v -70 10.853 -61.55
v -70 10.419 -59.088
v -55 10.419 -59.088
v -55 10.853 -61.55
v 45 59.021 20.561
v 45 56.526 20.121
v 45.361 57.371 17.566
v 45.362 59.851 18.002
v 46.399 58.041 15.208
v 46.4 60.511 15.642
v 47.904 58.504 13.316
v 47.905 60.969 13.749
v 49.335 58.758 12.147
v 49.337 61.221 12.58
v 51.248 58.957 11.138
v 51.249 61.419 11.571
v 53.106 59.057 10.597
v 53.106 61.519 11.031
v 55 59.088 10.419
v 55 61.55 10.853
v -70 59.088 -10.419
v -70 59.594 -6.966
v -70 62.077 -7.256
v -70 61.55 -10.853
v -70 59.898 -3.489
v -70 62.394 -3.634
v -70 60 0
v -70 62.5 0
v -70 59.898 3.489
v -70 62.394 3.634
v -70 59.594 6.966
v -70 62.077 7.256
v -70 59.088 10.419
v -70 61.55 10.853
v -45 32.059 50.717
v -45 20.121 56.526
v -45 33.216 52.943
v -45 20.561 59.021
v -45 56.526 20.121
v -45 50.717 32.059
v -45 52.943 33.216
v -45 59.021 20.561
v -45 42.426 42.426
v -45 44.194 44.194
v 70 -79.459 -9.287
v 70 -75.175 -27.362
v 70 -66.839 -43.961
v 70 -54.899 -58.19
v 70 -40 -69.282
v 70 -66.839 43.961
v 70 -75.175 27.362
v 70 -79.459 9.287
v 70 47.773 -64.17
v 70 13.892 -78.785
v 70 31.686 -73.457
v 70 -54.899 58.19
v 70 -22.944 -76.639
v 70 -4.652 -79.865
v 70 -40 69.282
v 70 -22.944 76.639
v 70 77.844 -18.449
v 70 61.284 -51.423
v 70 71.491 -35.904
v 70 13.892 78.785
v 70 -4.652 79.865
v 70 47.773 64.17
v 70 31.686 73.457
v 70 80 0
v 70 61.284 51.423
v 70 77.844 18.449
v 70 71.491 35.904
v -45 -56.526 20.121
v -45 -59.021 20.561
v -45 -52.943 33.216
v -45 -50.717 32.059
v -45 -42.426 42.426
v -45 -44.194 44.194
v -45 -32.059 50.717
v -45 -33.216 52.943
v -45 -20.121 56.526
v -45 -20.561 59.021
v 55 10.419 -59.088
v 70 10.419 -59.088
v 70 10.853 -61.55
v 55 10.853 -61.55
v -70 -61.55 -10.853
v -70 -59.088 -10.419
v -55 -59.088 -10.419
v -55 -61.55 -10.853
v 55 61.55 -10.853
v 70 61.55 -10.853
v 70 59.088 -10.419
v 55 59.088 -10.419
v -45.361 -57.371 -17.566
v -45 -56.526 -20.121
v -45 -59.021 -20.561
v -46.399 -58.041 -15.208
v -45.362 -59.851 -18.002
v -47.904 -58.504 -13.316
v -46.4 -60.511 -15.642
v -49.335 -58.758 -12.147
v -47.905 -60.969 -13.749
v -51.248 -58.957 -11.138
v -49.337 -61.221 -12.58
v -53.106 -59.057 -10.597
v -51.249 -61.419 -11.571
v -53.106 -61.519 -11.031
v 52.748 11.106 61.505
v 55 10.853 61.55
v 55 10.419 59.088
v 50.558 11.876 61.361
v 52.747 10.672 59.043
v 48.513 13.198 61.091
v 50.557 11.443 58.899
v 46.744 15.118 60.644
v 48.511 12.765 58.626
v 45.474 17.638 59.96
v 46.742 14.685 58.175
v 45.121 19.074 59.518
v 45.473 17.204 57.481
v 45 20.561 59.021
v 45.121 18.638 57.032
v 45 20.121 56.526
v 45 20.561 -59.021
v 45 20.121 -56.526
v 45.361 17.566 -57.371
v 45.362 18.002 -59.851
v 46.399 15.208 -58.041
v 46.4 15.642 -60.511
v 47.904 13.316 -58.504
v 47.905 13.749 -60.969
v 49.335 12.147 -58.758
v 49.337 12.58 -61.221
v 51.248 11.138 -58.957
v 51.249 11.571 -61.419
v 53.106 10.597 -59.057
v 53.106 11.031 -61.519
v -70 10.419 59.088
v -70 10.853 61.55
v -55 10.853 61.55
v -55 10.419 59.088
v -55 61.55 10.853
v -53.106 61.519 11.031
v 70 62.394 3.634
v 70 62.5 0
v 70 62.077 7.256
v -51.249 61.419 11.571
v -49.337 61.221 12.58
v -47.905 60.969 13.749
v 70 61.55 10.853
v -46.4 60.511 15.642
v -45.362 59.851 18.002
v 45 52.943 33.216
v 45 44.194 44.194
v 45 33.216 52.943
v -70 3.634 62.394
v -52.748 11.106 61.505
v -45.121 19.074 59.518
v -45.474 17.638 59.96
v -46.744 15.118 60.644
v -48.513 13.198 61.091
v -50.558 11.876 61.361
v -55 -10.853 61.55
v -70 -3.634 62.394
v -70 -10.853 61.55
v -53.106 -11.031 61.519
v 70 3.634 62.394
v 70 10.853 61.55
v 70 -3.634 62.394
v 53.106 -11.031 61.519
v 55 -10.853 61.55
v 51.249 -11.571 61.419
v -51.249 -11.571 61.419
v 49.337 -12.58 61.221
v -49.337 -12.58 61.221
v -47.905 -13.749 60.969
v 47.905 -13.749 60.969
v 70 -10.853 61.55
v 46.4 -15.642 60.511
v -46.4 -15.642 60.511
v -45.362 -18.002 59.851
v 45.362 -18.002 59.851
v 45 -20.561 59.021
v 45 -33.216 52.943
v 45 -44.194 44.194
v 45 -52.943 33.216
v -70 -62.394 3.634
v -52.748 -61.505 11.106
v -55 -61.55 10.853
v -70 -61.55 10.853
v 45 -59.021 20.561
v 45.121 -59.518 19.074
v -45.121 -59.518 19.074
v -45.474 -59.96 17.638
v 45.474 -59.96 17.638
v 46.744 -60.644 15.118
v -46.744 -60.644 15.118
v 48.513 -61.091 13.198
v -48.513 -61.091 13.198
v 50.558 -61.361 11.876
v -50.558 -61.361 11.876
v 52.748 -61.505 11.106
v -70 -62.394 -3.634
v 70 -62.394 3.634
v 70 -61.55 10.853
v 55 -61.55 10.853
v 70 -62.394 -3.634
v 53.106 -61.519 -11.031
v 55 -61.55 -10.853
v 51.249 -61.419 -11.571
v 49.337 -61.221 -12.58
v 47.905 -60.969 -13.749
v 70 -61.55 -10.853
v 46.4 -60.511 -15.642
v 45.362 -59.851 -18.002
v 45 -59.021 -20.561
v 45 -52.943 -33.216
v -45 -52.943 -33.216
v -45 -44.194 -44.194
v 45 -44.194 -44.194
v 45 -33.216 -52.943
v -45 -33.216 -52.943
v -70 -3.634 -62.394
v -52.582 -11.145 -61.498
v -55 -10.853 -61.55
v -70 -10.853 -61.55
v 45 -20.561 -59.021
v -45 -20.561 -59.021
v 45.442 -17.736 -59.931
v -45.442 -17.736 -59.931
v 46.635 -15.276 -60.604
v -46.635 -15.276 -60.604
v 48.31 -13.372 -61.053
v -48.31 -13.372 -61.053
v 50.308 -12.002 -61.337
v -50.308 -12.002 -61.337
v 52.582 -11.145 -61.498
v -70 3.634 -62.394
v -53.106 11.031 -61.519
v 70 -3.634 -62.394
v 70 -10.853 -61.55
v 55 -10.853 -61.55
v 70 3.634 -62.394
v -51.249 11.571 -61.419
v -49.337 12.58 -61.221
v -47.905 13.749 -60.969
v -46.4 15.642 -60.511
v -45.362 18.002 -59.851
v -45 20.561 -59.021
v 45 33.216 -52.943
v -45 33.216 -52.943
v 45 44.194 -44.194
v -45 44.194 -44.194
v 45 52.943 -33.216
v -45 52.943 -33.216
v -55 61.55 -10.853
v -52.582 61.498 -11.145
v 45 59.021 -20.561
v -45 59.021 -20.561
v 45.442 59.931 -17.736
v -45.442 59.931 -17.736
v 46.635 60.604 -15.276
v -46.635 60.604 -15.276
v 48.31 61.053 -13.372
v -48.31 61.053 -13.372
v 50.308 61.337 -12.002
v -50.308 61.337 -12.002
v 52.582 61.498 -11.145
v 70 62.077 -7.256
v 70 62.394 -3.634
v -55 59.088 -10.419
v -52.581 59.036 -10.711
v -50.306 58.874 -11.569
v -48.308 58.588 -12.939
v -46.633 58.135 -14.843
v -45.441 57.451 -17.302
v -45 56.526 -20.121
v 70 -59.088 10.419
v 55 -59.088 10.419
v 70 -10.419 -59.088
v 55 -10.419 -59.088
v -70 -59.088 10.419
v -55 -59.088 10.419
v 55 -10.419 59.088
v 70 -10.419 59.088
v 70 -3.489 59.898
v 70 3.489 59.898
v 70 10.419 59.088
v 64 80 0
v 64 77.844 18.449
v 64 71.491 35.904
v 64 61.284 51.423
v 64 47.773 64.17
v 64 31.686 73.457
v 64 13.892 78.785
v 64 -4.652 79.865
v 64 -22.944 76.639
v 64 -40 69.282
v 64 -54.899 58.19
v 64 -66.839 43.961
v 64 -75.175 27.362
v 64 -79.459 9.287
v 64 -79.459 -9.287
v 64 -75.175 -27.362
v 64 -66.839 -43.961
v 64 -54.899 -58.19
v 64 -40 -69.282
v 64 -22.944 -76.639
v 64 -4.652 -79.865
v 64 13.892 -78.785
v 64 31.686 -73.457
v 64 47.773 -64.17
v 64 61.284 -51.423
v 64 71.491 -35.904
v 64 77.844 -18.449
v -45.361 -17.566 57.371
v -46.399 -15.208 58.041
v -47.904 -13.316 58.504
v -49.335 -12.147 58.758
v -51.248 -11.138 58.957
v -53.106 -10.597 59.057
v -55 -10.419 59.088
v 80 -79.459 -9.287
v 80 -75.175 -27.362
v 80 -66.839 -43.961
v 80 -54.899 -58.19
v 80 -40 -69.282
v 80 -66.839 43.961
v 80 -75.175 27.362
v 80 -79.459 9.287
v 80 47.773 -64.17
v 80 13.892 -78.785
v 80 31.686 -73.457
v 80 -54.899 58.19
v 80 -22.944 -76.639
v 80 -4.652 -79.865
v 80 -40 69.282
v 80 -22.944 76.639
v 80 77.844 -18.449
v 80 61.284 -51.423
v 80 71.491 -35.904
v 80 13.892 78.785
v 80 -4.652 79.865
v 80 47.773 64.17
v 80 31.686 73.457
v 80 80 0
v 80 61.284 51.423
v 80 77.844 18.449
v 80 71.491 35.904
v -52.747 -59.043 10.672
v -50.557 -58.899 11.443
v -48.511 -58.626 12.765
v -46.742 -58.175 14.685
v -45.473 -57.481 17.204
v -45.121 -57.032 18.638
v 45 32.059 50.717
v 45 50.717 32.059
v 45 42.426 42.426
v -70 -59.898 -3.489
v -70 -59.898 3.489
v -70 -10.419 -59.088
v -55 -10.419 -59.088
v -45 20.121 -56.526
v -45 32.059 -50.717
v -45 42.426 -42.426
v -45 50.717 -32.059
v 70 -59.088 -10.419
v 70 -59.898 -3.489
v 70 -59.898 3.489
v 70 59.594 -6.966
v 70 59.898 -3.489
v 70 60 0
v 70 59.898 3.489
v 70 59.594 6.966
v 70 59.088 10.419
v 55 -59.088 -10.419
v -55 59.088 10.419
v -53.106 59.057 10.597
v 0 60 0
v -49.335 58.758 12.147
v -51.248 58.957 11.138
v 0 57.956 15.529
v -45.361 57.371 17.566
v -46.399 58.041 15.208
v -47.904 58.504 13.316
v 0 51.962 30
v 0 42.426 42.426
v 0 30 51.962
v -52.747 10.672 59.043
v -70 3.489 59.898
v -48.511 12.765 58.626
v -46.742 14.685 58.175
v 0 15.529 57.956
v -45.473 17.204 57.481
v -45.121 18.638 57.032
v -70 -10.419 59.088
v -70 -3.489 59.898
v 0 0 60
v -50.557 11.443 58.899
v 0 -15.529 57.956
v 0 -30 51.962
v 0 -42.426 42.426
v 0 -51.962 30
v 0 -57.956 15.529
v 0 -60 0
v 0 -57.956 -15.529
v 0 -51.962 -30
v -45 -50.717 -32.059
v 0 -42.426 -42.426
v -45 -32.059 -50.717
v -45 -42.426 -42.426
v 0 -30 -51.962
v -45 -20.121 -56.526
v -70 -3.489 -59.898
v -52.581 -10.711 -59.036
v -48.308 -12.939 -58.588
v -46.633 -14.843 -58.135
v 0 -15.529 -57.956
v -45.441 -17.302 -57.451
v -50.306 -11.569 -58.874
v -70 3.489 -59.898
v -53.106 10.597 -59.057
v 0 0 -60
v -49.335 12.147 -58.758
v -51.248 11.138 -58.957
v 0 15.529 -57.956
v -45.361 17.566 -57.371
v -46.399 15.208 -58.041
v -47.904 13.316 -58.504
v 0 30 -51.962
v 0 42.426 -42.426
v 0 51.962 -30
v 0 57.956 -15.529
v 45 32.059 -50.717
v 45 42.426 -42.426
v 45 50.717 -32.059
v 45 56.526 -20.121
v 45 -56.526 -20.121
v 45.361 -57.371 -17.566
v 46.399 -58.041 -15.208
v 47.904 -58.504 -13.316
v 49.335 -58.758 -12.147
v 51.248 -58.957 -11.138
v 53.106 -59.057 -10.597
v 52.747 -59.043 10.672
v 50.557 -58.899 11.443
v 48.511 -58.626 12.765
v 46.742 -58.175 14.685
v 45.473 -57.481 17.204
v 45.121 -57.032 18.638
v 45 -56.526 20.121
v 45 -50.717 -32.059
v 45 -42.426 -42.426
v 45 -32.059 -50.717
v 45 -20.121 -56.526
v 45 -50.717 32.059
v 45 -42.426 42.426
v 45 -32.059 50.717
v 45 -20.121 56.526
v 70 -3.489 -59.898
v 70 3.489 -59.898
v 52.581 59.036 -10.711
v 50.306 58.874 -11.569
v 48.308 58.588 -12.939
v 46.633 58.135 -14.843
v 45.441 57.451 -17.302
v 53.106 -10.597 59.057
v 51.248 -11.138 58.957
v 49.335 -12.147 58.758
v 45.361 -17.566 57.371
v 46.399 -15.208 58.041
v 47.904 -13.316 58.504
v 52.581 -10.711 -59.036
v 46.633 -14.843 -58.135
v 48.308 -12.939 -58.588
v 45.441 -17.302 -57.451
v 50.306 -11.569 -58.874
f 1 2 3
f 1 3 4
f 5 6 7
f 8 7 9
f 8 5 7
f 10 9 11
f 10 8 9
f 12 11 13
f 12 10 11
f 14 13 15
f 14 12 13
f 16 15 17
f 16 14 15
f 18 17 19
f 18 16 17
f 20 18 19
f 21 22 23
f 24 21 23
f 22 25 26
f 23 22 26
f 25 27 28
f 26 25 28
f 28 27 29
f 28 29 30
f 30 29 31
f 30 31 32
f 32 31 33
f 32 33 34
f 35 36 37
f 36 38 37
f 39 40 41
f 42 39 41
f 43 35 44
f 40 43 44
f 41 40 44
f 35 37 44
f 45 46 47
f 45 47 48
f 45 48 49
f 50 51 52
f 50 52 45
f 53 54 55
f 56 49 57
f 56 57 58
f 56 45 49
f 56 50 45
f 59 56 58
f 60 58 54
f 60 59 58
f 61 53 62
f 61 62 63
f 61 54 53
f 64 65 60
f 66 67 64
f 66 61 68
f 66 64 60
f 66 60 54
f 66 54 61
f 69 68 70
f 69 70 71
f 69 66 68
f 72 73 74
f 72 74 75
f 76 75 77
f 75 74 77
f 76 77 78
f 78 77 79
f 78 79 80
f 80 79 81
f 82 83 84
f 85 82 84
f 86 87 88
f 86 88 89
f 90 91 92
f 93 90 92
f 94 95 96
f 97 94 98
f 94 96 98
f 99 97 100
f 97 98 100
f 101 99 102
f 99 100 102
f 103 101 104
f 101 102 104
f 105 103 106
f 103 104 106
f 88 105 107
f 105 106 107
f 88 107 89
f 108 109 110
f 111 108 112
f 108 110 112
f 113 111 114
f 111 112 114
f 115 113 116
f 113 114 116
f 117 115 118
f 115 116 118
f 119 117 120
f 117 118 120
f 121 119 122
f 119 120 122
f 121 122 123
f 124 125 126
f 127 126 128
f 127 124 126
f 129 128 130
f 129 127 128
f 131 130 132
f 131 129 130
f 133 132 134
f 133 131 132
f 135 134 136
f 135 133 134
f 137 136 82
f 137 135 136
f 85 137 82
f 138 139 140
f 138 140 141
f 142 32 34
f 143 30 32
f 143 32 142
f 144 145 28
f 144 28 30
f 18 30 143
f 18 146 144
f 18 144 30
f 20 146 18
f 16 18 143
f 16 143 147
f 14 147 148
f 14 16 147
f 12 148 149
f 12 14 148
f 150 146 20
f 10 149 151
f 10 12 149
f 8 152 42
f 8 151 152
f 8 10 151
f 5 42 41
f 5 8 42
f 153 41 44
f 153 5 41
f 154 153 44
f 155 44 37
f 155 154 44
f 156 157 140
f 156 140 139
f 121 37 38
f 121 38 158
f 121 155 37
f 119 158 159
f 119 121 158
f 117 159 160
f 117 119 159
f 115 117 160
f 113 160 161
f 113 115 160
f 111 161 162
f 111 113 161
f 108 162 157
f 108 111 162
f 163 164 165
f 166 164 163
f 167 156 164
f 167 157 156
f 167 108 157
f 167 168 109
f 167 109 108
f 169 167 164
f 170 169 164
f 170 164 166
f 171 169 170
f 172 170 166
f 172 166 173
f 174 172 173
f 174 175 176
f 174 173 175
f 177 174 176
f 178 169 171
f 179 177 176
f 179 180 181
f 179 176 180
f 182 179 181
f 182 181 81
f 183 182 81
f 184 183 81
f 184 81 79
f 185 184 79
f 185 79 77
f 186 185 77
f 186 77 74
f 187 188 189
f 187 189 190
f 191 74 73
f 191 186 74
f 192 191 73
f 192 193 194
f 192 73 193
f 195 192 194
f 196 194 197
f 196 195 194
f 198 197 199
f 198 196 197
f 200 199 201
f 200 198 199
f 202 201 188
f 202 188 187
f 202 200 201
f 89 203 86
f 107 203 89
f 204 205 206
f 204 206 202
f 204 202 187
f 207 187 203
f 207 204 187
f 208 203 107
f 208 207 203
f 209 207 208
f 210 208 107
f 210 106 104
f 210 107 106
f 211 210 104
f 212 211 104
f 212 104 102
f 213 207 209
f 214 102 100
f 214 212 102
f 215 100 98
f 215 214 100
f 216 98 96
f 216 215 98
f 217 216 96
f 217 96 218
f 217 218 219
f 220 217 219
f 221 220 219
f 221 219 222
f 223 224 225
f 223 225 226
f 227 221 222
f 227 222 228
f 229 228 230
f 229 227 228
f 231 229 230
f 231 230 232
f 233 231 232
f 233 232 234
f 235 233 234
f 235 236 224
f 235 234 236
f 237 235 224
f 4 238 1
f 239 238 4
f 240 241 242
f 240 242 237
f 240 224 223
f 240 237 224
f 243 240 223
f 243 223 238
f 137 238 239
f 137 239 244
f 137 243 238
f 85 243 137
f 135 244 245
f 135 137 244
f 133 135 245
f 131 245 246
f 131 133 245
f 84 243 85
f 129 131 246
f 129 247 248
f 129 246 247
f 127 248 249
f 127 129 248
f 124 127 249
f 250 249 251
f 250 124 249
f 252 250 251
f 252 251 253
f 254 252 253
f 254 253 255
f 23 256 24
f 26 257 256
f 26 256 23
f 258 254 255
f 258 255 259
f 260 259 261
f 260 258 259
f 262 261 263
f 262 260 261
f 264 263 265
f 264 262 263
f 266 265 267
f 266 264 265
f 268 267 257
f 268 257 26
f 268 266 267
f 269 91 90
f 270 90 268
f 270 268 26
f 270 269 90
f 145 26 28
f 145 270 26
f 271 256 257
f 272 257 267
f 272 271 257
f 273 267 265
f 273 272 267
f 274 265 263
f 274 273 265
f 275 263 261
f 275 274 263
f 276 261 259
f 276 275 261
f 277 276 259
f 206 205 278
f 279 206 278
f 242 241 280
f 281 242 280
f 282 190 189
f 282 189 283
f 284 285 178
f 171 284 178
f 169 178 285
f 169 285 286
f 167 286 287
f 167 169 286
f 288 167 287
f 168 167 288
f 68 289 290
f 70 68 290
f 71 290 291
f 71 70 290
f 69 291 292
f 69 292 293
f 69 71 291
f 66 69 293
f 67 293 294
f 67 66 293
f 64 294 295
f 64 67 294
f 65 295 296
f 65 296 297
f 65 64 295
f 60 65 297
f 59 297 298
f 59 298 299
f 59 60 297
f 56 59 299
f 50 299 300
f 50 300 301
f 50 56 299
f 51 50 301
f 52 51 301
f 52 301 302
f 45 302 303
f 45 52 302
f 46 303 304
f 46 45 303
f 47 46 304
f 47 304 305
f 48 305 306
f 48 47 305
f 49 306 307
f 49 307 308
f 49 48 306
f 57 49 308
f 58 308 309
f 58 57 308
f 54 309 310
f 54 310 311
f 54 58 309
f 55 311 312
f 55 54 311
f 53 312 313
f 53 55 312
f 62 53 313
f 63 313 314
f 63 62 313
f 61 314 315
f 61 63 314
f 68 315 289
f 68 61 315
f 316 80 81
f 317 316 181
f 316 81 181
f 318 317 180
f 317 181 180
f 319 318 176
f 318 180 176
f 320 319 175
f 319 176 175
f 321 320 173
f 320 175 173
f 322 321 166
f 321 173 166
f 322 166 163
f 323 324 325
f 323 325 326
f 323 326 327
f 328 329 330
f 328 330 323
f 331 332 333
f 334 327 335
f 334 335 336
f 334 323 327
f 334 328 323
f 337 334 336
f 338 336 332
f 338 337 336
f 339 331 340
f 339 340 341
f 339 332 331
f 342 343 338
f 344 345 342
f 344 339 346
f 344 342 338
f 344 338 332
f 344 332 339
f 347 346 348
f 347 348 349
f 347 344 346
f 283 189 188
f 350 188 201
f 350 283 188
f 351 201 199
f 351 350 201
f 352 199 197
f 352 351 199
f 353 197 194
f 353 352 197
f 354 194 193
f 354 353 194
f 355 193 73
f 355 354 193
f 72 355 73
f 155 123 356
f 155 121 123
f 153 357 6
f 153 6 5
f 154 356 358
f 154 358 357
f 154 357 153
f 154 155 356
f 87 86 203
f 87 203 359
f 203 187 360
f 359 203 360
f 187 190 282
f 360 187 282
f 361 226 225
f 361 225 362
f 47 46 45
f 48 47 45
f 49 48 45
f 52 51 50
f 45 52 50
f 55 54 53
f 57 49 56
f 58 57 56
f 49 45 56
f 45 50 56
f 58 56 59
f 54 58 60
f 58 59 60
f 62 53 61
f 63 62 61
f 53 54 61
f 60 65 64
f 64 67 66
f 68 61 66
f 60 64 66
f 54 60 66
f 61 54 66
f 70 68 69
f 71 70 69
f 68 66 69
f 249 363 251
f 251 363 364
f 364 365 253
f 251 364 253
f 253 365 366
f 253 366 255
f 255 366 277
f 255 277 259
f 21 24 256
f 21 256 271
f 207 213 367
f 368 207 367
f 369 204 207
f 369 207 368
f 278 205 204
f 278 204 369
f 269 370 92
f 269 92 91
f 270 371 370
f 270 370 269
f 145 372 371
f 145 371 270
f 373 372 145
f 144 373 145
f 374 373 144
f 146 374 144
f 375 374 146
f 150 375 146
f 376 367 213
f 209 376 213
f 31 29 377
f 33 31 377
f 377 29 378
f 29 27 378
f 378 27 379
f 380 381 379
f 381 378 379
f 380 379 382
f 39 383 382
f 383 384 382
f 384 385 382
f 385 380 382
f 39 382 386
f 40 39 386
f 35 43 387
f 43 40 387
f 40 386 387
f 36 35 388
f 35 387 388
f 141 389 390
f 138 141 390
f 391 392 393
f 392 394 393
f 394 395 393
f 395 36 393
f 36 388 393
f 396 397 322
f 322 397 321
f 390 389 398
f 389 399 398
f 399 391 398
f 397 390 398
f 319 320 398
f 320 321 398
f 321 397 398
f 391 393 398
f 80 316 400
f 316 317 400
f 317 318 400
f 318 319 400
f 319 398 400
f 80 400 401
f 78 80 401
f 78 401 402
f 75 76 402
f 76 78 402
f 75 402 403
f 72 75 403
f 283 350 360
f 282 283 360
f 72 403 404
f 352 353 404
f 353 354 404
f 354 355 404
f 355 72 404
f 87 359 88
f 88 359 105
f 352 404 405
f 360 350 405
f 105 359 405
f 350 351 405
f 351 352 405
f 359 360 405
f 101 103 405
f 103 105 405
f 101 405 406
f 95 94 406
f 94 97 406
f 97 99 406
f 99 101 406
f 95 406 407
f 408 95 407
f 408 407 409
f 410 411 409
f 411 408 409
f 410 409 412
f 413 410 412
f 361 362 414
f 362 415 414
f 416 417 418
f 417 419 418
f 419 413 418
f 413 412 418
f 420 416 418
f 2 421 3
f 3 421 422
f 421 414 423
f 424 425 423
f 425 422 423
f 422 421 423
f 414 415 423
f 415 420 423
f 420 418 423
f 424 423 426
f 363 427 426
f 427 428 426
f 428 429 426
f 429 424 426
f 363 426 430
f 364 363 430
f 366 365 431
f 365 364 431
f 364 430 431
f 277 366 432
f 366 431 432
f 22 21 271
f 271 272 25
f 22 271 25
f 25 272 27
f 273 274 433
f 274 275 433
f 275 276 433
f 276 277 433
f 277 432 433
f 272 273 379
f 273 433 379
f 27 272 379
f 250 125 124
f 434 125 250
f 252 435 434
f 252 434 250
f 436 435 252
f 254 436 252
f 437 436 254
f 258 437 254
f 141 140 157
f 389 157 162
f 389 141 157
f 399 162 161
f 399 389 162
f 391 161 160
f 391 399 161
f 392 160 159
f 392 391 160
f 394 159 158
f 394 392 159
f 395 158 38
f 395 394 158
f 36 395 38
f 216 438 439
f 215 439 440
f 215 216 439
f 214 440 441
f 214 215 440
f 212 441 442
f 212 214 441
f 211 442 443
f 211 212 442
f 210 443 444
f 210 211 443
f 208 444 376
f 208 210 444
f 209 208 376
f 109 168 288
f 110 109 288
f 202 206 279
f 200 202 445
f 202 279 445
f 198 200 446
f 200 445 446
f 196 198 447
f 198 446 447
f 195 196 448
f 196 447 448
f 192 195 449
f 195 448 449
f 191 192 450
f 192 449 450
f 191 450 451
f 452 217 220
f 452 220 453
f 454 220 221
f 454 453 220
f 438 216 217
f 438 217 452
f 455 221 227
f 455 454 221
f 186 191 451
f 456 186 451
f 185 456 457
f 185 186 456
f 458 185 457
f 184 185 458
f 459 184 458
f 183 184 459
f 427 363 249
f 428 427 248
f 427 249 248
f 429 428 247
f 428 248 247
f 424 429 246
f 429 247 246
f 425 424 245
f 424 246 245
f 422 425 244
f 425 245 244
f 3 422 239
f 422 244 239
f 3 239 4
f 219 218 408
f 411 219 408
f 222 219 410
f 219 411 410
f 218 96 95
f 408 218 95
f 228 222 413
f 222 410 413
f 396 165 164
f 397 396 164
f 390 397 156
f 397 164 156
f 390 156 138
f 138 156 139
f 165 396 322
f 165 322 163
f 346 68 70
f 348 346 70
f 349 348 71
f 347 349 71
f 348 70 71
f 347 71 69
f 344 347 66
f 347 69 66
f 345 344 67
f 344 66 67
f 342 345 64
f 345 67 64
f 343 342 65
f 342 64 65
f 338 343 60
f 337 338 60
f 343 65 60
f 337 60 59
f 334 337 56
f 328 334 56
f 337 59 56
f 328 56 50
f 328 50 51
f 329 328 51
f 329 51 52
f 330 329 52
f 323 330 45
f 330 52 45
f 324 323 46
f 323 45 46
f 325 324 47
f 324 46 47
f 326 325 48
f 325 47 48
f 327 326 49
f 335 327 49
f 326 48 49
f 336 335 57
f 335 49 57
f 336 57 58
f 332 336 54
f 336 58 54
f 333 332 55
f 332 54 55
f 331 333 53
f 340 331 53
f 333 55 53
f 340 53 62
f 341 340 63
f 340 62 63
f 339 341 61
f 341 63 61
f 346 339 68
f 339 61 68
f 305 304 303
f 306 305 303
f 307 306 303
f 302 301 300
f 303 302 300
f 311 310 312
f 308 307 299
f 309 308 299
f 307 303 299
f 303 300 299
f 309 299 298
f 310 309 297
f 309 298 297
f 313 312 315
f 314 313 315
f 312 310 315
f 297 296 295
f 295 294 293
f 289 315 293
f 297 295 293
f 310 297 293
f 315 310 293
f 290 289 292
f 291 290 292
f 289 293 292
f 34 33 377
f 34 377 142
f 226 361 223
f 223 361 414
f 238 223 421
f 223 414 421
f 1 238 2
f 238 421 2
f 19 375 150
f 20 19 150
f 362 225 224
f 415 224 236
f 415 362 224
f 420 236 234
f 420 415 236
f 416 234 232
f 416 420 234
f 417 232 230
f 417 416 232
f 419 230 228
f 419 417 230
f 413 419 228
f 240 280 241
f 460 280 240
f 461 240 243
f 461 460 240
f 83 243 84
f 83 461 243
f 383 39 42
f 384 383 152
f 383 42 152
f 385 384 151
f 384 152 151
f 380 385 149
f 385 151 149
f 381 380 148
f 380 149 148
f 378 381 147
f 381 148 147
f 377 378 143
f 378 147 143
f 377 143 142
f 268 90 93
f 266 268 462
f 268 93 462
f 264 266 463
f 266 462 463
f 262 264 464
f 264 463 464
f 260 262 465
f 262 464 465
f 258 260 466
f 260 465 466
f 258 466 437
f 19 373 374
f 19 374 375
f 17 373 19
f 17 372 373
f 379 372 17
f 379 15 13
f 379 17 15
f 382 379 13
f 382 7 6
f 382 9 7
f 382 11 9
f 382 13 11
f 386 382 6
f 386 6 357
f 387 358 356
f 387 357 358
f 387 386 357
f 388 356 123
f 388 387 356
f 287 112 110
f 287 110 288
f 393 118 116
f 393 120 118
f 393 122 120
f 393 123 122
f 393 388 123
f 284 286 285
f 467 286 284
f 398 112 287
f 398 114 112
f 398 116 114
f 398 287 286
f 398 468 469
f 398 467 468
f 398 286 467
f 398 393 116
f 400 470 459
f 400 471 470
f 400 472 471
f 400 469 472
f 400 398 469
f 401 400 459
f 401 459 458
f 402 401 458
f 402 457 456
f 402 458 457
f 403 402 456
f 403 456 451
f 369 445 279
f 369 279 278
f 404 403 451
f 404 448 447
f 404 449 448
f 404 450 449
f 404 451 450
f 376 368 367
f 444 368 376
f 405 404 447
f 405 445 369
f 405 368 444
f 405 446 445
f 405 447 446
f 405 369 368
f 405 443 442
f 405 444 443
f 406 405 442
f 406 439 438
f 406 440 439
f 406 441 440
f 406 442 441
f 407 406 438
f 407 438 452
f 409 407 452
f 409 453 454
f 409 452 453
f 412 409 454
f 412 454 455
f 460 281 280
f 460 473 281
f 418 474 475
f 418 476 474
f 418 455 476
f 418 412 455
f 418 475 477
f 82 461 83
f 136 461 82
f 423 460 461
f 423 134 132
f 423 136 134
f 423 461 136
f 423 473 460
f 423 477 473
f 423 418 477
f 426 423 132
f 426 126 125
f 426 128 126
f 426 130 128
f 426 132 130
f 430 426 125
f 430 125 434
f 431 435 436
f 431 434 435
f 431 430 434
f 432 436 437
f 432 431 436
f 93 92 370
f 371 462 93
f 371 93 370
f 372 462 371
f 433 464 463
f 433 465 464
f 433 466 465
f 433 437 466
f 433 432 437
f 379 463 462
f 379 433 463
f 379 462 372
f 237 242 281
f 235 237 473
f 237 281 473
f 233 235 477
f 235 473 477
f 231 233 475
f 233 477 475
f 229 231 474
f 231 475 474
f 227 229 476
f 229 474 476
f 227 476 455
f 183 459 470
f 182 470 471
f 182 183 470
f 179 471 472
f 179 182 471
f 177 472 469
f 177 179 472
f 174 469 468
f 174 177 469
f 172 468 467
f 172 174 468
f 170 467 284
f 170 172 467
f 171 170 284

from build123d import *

# Parameters (mm, degrees)
F0_R     = 62.5
F0_R_2   = 60
F1_DEPTH = 70
F2_R     = 80
F2_R_2   = 62.5
F2_R_3   = 60
F3_DEPTH = 6
F4_DEPTH = 10
F6_DEPTH = 25
F7_R     = 10


with BuildPart() as f1:
    # F0 (on Right) → F1 (new body)
    with BuildSketch(Plane.YZ):
        Circle(F0_R)
        Circle(F0_R_2, mode=Mode.SUBTRACT)
    extrude(amount=F1_DEPTH)

    # F5 (on face) → F6 (cut)
    with BuildSketch(Plane.YZ.offset(70)):
        with BuildLine():
            Line((61.5504845633, -10.8530111042), (59.0884651807, -10.41889066))
            ThreePointArc((59.0884651807, -10.41889066), (42.4264068712, -42.4264068712), (10.41889066, -59.0884651807))
            Line((10.41889066, -59.0884651807), (10.8530111042, -61.5504845633))
            ThreePointArc((10.8530111042, -61.5504845633), (44.1941738242, -44.1941738242), (61.5504845633, -10.8530111042))
        make_face()
        with BuildLine():
            Line((-10.8530111042, -61.5504845633), (-10.41889066, -59.0884651807))
            ThreePointArc((-10.41889066, -59.0884651807), (-42.4264068712, -42.4264068712), (-59.0884651807, -10.41889066))
            Line((-59.0884651807, -10.41889066), (-61.5504845633, -10.8530111042))
            ThreePointArc((-61.5504845633, -10.8530111042), (-44.1941738242, -44.1941738242), (-10.8530111042, -61.5504845633))
        make_face()
        with BuildLine():
            Line((-61.5504845633, 10.8530111042), (-59.0884651807, 10.41889066))
            ThreePointArc((-59.0884651807, 10.41889066), (-42.4264068712, 42.4264068712), (-10.41889066, 59.0884651807))
            Line((-10.41889066, 59.0884651807), (-10.8530111042, 61.5504845633))
            ThreePointArc((-10.8530111042, 61.5504845633), (-44.1941738242, 44.1941738242), (-61.5504845633, 10.8530111042))
        make_face()
        with BuildLine():
            Line((10.8530111042, 61.5504845633), (10.41889066, 59.0884651807))
            ThreePointArc((10.41889066, 59.0884651807), (42.4264068712, 42.4264068712), (59.0884651807, 10.41889066))
            Line((59.0884651807, 10.41889066), (61.5504845633, 10.8530111042))
            ThreePointArc((61.5504845633, 10.8530111042), (44.1941738242, 44.1941738242), (10.8530111042, 61.5504845633))
        make_face()
    extrude(amount=-F6_DEPTH, mode=Mode.SUBTRACT)

    # F7
    f7_edges = [f1.edges().sort_by_distance(p)[0] for p in [
        (45, 60.319475, -10.635951),
        (45, 10.635951, -60.319475),
        (45, -60.319475, -10.635951),
        (45, 10.635951, 60.319475),
        (45, 60.319475, 10.635951),
        (45, -60.319475, 10.635951),
        (45, -10.635951, 60.319475),
        (45, -10.635951, -60.319475),
    ]]
    fillet(f7_edges, radius=F7_R)

    # F8: F1 across plane


with BuildPart() as f3:
    # F2 (on face) → F3 (new body)
    with BuildSketch(Plane.YZ.offset(70)):
        Circle(F2_R)
        Circle(F2_R_2, mode=Mode.SUBTRACT)
        Circle(F2_R_2)
        Circle(F2_R_3, mode=Mode.SUBTRACT)
        Circle(F2_R_3)
    extrude(amount=-F3_DEPTH)


with BuildPart() as f4:
    # F2 (on face) → F4 (new body)
    with BuildSketch(Plane.YZ.offset(70)):
        Circle(F2_R)
        Circle(F2_R_2, mode=Mode.SUBTRACT)
        Circle(F2_R_2)
        Circle(F2_R_3, mode=Mode.SUBTRACT)
        Circle(F2_R_3)
    extrude(amount=F4_DEPTH)


with BuildPart() as f1_1:
    add(f1.part)
    add(f1.part.mirror(Plane.YZ))


solid = Compound([f3.part, f4.part, f1_1.part])
